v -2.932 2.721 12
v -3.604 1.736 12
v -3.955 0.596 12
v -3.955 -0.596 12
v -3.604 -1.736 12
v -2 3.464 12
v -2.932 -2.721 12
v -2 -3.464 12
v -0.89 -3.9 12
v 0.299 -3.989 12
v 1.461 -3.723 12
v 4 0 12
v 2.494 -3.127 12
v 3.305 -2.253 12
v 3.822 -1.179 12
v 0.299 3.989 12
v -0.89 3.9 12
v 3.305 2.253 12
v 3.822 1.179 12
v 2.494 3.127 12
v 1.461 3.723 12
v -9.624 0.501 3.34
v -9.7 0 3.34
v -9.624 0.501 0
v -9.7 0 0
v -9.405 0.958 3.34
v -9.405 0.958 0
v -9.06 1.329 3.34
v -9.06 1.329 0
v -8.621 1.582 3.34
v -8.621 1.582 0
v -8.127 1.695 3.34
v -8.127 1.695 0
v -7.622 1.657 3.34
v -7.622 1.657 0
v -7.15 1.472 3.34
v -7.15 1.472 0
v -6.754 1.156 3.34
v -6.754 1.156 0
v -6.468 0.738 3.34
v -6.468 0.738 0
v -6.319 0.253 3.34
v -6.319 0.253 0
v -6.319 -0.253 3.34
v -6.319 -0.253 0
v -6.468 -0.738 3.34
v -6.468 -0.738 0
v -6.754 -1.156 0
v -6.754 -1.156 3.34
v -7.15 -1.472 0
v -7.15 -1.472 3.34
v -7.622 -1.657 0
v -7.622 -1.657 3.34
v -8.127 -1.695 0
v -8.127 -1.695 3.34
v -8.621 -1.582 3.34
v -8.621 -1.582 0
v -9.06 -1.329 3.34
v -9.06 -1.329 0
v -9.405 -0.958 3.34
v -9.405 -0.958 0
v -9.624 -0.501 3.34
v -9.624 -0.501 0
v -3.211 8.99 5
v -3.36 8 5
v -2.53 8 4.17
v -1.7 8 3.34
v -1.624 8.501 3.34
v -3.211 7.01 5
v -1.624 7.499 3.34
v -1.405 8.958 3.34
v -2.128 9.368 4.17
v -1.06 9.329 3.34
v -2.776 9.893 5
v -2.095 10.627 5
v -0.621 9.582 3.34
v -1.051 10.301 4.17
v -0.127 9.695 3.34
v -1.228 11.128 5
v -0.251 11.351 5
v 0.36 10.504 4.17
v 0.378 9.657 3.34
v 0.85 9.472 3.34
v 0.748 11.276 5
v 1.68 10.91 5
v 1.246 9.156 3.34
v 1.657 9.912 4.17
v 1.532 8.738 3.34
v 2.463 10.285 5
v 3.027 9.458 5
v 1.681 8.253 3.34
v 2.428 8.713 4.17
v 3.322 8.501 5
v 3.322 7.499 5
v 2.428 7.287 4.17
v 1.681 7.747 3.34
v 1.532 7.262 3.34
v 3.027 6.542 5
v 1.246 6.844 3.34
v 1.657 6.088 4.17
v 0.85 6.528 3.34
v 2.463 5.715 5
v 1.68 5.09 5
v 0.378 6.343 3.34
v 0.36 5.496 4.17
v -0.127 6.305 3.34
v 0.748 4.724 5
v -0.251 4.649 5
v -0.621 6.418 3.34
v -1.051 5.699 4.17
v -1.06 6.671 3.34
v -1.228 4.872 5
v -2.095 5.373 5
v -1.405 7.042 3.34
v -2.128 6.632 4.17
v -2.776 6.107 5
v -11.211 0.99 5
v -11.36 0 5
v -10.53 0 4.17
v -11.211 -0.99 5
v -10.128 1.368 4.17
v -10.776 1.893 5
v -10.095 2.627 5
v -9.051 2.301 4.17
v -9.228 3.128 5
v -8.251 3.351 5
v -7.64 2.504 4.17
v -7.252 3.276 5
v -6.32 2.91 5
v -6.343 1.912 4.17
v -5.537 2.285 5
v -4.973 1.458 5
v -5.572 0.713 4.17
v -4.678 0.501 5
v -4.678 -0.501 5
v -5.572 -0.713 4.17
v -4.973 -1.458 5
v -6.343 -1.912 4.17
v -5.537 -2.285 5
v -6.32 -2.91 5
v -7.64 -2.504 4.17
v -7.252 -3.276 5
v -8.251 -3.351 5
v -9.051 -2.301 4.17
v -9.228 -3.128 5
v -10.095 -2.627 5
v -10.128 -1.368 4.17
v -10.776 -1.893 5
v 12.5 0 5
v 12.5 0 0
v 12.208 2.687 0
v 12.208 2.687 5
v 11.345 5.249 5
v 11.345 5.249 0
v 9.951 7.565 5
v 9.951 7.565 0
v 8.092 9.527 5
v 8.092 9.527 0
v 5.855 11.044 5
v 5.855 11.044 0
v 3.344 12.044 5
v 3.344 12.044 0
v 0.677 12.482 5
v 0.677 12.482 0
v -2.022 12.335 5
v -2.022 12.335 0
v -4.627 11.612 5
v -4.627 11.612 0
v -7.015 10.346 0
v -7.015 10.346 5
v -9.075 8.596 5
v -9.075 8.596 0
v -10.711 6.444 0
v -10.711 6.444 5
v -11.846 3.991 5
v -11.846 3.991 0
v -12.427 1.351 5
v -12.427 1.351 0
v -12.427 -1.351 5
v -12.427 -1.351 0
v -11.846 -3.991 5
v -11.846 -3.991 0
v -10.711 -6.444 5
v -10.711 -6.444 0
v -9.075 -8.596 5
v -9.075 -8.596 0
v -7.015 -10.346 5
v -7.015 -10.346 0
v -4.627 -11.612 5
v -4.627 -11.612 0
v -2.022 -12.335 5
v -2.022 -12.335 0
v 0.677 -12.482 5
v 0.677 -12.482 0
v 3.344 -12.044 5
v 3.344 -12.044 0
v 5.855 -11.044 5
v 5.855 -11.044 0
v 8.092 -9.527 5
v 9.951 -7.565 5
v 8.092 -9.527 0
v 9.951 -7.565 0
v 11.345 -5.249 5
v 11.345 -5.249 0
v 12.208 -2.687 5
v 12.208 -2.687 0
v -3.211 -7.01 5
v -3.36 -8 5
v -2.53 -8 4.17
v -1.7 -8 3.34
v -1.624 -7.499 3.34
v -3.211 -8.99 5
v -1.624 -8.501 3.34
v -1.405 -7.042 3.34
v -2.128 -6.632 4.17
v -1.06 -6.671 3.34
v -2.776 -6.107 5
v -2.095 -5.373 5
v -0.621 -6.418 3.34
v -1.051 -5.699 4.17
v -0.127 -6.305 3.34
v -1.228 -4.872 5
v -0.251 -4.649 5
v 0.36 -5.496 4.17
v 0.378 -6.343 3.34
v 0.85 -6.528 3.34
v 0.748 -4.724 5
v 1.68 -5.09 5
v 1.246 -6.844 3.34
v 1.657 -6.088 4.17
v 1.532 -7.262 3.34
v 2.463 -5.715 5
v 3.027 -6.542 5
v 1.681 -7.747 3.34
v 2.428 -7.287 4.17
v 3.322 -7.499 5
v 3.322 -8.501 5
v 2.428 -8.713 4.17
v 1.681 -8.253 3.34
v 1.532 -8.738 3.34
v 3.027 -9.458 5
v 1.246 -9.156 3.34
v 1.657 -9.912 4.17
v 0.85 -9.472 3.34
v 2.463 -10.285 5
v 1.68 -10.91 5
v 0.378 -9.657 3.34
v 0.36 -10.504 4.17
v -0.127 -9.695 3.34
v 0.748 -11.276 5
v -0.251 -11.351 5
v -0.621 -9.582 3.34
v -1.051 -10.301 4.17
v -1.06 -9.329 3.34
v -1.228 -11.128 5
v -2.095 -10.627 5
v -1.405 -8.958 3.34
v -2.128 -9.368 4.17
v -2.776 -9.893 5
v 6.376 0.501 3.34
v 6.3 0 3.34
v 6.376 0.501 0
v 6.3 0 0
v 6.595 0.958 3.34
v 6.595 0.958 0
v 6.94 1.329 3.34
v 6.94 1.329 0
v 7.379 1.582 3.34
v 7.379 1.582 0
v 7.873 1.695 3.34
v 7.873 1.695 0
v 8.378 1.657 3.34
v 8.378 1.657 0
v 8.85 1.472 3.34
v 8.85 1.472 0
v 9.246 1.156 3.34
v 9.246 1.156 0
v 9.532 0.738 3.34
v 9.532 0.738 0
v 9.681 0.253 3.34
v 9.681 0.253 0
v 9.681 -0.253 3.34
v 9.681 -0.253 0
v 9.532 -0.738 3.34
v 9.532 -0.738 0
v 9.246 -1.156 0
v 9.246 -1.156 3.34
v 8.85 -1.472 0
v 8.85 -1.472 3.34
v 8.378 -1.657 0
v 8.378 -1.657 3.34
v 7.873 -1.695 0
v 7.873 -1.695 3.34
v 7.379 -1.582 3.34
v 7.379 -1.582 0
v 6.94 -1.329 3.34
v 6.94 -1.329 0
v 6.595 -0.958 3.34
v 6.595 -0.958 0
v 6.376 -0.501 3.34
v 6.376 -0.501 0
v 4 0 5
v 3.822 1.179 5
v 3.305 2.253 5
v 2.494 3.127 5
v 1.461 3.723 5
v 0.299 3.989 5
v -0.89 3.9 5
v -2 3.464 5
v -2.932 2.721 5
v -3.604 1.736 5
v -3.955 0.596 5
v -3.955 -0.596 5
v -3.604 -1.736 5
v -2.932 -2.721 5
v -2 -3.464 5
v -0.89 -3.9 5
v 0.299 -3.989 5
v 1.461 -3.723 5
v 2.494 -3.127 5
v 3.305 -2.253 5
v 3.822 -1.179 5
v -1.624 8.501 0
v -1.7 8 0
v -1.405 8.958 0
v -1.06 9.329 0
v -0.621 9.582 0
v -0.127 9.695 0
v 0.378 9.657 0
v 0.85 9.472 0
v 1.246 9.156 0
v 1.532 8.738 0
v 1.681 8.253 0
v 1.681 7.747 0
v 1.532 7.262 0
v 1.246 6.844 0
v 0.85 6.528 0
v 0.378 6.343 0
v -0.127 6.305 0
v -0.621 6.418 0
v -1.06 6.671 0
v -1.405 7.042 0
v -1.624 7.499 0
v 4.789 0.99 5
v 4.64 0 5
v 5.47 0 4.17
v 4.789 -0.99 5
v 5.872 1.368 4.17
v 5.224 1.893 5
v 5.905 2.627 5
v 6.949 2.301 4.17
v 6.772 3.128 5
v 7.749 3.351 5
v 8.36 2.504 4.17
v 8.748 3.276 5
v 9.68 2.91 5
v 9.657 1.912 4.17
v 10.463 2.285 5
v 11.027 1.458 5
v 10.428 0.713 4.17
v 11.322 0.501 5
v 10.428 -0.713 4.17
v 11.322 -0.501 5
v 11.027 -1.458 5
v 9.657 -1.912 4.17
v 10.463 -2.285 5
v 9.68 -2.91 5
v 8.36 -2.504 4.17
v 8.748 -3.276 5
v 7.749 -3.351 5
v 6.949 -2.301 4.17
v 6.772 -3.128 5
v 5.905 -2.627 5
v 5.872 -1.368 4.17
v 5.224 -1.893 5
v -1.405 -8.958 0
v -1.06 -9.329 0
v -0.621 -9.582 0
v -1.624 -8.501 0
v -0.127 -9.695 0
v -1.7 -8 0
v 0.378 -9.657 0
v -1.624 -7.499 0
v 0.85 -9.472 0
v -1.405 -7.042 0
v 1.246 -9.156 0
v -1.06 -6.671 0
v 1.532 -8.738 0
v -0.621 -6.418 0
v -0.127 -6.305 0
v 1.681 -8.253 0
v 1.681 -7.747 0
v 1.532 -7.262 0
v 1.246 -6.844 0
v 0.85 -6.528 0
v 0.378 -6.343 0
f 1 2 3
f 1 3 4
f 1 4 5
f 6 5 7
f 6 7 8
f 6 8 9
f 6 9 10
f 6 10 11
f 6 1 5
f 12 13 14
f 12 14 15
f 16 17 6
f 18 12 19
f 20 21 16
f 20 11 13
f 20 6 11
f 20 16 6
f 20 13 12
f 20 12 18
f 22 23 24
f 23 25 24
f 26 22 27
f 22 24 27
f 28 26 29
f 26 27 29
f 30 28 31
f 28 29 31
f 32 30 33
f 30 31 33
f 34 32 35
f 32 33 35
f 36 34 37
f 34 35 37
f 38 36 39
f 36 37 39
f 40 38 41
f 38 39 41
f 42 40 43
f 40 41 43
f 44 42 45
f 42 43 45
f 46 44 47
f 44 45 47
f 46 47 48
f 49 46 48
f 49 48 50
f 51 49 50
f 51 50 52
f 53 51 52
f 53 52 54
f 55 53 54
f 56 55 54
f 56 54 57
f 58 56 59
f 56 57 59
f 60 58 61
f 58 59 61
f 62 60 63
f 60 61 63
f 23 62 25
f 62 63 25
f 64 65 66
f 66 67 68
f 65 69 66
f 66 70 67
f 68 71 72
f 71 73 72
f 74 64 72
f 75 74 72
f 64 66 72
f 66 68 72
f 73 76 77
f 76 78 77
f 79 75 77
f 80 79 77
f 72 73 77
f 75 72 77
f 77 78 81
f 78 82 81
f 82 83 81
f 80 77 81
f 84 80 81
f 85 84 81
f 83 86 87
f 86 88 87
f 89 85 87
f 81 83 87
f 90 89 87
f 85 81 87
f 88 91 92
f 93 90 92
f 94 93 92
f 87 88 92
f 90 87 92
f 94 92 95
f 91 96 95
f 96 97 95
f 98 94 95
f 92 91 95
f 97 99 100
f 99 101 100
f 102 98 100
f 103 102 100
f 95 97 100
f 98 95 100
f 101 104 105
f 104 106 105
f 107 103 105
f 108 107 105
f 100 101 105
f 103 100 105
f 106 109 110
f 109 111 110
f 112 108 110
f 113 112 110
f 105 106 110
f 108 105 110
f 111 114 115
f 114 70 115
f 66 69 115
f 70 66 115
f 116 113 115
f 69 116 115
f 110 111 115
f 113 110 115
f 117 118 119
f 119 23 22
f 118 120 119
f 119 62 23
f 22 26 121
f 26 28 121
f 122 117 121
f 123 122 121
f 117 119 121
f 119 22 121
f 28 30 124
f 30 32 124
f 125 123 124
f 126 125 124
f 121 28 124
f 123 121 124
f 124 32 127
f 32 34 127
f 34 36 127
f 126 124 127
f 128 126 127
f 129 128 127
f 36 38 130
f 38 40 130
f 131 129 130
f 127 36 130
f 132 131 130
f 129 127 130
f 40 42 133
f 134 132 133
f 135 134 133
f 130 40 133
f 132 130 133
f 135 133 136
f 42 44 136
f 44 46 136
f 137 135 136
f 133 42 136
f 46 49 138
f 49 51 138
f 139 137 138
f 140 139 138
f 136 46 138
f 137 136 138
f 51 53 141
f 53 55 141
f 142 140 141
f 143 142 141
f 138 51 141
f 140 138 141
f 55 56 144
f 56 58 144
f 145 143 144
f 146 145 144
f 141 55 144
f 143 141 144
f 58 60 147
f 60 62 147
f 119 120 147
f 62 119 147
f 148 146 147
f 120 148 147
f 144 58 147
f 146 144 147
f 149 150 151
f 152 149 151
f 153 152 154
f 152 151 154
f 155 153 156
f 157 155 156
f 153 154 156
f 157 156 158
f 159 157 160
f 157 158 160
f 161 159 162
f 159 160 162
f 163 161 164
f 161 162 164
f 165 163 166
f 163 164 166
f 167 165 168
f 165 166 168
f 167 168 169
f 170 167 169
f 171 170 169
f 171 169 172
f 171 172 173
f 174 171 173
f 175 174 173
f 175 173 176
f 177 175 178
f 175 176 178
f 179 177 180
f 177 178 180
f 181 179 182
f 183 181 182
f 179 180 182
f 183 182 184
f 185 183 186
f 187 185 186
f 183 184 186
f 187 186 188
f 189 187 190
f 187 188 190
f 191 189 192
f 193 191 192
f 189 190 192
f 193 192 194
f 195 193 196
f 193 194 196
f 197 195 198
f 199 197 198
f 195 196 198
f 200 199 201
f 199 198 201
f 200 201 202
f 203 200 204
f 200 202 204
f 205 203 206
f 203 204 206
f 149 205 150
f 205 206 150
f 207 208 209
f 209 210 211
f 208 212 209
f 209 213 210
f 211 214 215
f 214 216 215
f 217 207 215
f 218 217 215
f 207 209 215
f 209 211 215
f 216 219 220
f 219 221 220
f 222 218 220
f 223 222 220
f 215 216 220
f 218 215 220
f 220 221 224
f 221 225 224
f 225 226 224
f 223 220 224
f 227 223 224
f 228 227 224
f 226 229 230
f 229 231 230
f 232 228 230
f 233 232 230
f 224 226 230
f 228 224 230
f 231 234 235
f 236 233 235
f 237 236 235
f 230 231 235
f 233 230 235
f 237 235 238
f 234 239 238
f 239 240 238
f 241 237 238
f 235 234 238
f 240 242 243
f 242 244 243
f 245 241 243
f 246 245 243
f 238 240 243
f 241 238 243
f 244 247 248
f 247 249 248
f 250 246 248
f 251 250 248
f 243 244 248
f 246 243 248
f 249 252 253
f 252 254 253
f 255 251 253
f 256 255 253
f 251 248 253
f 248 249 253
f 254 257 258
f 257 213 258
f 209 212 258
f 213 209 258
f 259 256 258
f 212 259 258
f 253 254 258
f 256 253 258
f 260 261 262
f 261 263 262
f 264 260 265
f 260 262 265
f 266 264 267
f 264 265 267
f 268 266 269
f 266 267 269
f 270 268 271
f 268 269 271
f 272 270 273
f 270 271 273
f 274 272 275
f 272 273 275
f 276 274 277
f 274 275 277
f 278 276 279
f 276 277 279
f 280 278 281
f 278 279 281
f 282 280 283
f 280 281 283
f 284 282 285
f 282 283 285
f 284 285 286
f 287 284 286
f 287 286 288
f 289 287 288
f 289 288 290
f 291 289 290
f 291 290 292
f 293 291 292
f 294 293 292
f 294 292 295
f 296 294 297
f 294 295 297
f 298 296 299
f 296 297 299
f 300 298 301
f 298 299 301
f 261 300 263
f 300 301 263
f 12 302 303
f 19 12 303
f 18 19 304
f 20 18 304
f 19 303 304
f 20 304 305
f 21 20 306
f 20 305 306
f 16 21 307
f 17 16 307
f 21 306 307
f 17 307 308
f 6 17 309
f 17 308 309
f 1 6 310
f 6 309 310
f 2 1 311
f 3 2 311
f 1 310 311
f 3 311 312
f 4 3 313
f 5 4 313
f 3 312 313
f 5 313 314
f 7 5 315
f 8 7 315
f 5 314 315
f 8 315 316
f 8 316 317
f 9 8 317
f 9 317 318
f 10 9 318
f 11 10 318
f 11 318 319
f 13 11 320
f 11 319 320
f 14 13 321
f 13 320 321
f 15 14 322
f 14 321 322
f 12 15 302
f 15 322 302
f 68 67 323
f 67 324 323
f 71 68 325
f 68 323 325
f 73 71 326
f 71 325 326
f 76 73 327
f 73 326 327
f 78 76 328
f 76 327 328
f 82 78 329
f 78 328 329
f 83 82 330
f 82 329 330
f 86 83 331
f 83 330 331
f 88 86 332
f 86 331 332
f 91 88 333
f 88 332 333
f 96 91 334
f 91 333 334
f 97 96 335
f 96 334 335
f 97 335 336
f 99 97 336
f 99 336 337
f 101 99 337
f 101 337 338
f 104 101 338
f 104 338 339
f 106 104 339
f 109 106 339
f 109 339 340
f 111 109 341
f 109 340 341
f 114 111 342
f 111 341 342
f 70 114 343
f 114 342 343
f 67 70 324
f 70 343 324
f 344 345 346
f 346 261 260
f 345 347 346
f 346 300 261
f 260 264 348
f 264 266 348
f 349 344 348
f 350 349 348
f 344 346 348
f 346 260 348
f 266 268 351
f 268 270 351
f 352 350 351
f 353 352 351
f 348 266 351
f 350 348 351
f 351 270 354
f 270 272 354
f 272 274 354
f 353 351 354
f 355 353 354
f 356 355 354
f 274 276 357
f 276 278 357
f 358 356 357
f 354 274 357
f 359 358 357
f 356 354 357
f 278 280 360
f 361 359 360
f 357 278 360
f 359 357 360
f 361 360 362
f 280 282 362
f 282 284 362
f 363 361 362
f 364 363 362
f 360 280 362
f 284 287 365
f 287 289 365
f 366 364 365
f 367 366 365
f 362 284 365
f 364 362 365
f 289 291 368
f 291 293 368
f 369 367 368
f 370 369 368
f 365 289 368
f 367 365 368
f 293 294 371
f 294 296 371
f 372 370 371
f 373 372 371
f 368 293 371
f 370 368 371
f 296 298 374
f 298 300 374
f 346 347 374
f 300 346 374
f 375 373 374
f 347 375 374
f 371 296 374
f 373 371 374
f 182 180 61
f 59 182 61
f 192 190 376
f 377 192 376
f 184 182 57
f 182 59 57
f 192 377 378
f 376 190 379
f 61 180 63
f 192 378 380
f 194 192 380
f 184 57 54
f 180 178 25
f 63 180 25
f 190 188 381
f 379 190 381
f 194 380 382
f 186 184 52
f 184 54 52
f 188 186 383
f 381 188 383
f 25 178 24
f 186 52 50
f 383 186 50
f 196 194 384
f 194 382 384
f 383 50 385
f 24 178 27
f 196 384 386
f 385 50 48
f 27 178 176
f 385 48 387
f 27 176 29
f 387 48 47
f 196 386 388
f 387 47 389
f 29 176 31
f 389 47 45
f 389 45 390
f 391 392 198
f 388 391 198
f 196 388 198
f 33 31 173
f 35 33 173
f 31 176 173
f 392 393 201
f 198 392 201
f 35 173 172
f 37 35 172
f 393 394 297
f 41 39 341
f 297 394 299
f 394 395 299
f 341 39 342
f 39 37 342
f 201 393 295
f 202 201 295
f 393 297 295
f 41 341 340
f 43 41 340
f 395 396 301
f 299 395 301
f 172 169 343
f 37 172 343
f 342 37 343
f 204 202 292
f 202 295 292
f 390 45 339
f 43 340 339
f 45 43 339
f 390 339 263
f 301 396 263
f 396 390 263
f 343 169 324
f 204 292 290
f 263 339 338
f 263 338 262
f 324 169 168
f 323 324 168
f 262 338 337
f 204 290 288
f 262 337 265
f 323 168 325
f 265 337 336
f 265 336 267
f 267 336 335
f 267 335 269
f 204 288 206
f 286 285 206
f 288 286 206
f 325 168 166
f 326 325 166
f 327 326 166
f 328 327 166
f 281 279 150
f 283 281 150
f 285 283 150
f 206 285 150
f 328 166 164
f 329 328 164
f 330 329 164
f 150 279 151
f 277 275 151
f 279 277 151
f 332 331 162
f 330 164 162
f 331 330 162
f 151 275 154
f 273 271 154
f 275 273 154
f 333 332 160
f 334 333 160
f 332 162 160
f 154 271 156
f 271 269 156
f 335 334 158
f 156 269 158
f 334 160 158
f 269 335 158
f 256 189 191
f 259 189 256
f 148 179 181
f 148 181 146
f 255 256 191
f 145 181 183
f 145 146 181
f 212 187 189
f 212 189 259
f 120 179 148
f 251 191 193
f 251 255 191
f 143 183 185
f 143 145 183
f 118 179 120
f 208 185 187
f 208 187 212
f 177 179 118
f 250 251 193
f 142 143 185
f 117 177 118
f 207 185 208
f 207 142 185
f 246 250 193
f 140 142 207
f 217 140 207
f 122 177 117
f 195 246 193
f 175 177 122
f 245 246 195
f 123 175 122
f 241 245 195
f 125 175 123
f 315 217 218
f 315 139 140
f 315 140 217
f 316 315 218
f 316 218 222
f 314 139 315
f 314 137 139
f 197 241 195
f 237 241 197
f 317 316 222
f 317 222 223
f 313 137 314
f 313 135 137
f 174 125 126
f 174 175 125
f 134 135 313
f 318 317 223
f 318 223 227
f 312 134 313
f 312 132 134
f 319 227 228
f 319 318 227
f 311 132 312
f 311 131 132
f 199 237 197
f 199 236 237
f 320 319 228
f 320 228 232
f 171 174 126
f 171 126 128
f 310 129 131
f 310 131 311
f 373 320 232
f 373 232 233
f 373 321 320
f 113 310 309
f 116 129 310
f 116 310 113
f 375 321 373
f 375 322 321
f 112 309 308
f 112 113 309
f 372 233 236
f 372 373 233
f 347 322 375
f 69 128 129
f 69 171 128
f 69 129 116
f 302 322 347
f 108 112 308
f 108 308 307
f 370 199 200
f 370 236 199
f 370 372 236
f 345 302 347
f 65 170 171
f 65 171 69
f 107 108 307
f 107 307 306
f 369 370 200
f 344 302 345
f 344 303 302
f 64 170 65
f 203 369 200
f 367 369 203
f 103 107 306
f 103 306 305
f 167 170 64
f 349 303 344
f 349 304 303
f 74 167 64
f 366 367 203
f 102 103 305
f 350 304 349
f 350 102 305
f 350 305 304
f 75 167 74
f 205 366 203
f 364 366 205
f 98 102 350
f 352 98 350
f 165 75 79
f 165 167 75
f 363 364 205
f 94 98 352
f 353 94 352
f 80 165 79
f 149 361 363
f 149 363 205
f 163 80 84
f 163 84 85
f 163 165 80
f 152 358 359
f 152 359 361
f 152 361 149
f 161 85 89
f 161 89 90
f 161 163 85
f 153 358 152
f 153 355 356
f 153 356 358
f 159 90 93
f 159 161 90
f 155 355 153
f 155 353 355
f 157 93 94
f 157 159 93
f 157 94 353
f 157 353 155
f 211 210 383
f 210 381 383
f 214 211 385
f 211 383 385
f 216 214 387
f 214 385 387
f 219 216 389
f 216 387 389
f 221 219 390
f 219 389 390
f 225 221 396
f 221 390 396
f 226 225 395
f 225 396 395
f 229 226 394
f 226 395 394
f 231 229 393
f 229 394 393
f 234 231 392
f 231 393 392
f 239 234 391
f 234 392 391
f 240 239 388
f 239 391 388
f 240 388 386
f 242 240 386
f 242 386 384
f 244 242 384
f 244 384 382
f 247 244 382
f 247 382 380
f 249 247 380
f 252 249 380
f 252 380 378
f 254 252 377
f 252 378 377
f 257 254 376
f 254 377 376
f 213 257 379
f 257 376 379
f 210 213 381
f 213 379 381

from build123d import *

# Parameters (mm, degrees)
ESBO_O2_R                                           = 12.5
RESSALTO_EXTRUS_O1_DEPTH                            = 5
ESBO_O3_R                                           = 4
RESSALTO_EXTRUS_O2_DEPTH                            = 7
ESCAREADO_PARA_PARAFUSO_ALLEN_SEXTAVADO_D           = 3.4
ESCAREADO_PARA_PARAFUSO_ALLEN_SEXTAVADO_CSINK_D     = 6.72
ESCAREADO_PARA_PARAFUSO_ALLEN_SEXTAVADO_CSINK_ANGLE = 90


with BuildPart() as part:
    # Esboço2 → Ressalto-extrusão1 (new body)
    with BuildSketch(Plane.XY):
        Circle(ESBO_O2_R)
    extrude(amount=RESSALTO_EXTRUS_O1_DEPTH)

    # Esboço3 → Ressalto-extrusão2 (add)
    with BuildSketch(Plane.XY.offset(5)):
        Circle(ESBO_O3_R)
    extrude(amount=RESSALTO_EXTRUS_O2_DEPTH)

    # Escareado para parafuso Allen sextavado escareado de M31 (through all)
    with Locations(Plane.XY.offset(5)):
        with Locations((0, 8), (8, 0), (0, -8), (-8, 0)):
            CounterSinkHole(ESCAREADO_PARA_PARAFUSO_ALLEN_SEXTAVADO_D / 2, ESCAREADO_PARA_PARAFUSO_ALLEN_SEXTAVADO_CSINK_D / 2, counter_sink_angle=ESCAREADO_PARA_PARAFUSO_ALLEN_SEXTAVADO_CSINK_ANGLE)


solid = part.part
